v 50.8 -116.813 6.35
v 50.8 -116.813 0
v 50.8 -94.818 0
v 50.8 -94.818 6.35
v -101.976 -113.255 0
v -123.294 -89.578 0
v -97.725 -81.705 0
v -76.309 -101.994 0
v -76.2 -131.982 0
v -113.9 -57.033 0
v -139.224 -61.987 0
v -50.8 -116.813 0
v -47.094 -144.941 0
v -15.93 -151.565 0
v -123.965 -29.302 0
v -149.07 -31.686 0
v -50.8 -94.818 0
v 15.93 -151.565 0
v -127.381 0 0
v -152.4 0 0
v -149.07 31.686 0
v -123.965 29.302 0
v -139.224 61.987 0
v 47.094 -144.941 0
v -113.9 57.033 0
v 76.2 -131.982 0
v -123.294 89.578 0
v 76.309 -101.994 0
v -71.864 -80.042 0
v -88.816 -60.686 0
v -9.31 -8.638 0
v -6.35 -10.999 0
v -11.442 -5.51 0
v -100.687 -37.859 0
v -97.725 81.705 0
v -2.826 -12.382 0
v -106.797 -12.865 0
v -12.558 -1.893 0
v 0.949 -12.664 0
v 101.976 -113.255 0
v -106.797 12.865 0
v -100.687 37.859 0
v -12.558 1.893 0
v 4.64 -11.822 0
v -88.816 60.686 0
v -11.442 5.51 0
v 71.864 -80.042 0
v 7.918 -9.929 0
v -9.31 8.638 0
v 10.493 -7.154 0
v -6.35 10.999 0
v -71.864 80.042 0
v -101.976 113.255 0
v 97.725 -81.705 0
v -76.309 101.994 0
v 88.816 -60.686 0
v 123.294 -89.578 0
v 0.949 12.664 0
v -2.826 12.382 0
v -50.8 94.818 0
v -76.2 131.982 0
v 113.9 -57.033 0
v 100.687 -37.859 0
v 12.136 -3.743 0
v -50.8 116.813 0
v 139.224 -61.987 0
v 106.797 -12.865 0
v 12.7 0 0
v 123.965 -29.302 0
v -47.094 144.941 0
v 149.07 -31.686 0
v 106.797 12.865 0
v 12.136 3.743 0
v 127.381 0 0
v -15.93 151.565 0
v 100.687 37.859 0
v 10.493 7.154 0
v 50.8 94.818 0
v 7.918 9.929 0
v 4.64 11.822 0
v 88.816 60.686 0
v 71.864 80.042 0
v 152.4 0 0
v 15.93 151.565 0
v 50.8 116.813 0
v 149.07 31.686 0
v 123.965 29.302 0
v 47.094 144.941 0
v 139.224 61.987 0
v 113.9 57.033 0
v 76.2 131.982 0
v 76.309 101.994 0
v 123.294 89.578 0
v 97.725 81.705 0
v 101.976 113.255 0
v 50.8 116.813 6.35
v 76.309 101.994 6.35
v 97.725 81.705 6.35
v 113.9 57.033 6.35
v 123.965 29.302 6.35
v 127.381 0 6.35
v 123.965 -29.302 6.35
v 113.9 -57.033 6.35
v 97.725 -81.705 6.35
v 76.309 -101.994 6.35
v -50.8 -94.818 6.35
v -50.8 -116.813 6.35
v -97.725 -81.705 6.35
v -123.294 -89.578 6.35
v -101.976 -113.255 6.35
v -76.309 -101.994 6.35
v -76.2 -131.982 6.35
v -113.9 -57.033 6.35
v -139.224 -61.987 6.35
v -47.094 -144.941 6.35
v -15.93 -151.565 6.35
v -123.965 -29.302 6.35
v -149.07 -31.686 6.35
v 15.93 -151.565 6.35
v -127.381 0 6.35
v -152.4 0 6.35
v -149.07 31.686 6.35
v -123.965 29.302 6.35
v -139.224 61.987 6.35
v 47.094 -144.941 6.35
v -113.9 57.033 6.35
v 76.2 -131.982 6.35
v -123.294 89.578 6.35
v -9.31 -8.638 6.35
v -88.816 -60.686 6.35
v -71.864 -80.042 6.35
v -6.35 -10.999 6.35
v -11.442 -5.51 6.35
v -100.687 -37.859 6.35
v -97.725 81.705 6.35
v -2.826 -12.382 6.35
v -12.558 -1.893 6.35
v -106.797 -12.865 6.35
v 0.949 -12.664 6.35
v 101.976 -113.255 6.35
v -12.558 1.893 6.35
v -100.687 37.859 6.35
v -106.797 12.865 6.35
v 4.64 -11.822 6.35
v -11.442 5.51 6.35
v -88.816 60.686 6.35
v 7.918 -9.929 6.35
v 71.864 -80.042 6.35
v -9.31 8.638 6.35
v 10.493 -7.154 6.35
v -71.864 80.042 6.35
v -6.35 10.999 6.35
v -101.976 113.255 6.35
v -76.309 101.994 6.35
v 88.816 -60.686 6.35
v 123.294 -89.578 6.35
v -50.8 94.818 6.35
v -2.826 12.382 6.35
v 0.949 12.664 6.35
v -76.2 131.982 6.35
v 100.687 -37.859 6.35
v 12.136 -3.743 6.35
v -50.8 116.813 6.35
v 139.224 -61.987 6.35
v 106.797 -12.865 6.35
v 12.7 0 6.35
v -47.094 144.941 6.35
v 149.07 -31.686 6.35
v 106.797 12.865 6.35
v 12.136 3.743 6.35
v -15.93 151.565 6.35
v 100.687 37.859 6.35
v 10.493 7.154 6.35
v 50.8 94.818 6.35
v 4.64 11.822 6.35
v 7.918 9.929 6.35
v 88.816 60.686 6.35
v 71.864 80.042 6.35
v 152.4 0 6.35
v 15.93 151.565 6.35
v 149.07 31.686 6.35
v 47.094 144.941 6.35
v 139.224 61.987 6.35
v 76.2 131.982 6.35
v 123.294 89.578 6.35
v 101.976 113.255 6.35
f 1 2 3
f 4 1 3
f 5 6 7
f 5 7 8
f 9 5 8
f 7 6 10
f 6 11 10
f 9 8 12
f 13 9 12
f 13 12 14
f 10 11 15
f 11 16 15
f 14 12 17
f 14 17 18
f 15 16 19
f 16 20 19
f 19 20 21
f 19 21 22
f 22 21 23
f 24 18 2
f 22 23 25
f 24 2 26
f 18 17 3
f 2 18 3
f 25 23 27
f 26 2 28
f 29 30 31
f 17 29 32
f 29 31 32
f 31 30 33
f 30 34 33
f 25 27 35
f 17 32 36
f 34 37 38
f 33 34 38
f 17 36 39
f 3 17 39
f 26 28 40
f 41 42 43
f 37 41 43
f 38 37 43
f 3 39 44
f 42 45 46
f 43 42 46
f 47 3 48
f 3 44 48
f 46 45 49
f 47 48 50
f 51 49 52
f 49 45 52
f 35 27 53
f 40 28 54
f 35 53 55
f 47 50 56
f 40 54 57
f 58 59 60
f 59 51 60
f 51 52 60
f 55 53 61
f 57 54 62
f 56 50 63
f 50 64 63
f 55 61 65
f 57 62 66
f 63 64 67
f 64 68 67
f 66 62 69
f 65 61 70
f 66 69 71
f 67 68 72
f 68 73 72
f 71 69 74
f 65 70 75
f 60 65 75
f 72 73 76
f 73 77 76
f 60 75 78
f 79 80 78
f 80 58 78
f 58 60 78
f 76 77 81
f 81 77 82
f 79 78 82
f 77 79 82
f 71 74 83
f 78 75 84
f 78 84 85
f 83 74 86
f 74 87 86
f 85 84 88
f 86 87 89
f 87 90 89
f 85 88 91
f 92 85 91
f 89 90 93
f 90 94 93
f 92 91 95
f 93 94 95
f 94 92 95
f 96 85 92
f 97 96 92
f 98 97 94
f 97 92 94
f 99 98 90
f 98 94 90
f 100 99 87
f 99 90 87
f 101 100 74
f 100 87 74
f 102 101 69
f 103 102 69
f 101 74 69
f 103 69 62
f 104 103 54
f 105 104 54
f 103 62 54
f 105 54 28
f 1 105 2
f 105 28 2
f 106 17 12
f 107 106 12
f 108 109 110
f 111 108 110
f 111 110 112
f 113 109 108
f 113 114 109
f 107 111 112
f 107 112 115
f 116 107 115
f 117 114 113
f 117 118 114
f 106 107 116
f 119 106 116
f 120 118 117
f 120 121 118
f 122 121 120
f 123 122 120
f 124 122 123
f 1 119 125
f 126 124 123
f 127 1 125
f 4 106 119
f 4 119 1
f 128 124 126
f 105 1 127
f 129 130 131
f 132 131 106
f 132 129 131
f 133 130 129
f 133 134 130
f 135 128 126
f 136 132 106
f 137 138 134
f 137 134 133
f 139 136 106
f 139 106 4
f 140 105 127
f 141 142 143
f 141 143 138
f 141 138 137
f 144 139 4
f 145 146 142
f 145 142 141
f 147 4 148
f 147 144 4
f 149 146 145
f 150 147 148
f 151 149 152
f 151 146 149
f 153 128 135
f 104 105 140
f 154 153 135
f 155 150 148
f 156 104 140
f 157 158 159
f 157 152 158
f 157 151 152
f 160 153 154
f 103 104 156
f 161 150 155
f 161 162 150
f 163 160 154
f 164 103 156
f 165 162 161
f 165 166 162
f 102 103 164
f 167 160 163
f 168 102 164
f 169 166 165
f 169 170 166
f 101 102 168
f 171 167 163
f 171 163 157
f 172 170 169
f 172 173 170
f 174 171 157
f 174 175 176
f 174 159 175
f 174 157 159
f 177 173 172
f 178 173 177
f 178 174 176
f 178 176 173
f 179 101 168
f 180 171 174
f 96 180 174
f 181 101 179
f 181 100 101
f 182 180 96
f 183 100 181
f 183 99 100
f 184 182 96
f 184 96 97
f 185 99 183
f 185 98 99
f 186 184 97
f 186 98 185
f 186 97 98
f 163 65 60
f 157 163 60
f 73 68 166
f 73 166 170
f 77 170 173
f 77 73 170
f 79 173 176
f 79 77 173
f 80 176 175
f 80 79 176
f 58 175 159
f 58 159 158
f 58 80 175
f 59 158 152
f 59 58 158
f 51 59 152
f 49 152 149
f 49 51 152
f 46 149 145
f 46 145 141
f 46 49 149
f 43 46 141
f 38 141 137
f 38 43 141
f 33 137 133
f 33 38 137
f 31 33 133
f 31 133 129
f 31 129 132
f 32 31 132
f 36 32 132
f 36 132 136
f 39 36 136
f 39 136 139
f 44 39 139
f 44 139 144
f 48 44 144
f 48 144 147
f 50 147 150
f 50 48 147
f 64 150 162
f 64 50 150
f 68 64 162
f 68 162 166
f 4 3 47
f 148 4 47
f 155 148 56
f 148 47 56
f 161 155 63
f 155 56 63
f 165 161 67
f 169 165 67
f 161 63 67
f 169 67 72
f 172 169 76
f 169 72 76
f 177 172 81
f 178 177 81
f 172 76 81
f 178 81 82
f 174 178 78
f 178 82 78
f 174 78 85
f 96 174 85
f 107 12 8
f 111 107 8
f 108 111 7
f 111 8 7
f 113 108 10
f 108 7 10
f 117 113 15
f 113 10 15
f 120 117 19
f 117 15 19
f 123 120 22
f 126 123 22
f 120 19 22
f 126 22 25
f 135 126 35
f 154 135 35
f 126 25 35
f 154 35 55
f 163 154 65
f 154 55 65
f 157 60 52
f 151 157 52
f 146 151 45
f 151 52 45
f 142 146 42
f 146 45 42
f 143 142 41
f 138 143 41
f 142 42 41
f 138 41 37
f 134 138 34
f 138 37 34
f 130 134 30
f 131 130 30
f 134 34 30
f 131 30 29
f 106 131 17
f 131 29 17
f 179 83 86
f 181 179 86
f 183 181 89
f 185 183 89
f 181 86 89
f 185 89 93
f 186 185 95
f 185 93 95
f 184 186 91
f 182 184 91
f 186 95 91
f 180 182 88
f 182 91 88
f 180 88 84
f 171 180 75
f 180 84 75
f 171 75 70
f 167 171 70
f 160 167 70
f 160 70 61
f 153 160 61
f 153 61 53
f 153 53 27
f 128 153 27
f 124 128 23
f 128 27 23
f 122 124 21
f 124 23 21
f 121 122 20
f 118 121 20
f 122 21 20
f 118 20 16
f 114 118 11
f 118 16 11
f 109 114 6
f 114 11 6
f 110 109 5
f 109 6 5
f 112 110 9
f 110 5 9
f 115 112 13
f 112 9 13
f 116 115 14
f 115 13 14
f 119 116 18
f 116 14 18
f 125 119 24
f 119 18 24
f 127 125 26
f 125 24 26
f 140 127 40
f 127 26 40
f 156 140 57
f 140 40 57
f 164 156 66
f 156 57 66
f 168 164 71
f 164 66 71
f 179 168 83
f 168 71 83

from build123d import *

# Parameters (mm, degrees)
F0_R     = 152.4
F0_R_2   = 12.7
F1_DEPTH = 6.35


with BuildPart() as f1:
    # F0 (on Top) → F1 (new body)
    with BuildSketch(Plane.XY):
        Circle(F0_R)
        with BuildLine():
            ThreePointArc((-50.8, -116.813009), (-127.381, 0), (-50.8, 116.813009))
            Line((-50.8, 116.813009), (-50.8, 94.817982))
            ThreePointArc((-50.8, 94.817982), (-107.569, 0), (-50.8, -94.817982))
            Line((-50.8, -94.817982), (-50.8, -116.813009))
        make_face(mode=Mode.SUBTRACT)
        Circle(F0_R_2, mode=Mode.SUBTRACT)
        with BuildLine():
            Line((50.8, 94.817982), (50.8, 116.813009))
            ThreePointArc((50.8, 116.813009), (127.381, 0), (50.8, -116.813009))
            Line((50.8, -116.813009), (50.8, -94.817982))
            ThreePointArc((50.8, -94.817982), (107.569, 0), (50.8, 94.817982))
        make_face(mode=Mode.SUBTRACT)
    extrude(amount=F1_DEPTH)


solid = f1.part
